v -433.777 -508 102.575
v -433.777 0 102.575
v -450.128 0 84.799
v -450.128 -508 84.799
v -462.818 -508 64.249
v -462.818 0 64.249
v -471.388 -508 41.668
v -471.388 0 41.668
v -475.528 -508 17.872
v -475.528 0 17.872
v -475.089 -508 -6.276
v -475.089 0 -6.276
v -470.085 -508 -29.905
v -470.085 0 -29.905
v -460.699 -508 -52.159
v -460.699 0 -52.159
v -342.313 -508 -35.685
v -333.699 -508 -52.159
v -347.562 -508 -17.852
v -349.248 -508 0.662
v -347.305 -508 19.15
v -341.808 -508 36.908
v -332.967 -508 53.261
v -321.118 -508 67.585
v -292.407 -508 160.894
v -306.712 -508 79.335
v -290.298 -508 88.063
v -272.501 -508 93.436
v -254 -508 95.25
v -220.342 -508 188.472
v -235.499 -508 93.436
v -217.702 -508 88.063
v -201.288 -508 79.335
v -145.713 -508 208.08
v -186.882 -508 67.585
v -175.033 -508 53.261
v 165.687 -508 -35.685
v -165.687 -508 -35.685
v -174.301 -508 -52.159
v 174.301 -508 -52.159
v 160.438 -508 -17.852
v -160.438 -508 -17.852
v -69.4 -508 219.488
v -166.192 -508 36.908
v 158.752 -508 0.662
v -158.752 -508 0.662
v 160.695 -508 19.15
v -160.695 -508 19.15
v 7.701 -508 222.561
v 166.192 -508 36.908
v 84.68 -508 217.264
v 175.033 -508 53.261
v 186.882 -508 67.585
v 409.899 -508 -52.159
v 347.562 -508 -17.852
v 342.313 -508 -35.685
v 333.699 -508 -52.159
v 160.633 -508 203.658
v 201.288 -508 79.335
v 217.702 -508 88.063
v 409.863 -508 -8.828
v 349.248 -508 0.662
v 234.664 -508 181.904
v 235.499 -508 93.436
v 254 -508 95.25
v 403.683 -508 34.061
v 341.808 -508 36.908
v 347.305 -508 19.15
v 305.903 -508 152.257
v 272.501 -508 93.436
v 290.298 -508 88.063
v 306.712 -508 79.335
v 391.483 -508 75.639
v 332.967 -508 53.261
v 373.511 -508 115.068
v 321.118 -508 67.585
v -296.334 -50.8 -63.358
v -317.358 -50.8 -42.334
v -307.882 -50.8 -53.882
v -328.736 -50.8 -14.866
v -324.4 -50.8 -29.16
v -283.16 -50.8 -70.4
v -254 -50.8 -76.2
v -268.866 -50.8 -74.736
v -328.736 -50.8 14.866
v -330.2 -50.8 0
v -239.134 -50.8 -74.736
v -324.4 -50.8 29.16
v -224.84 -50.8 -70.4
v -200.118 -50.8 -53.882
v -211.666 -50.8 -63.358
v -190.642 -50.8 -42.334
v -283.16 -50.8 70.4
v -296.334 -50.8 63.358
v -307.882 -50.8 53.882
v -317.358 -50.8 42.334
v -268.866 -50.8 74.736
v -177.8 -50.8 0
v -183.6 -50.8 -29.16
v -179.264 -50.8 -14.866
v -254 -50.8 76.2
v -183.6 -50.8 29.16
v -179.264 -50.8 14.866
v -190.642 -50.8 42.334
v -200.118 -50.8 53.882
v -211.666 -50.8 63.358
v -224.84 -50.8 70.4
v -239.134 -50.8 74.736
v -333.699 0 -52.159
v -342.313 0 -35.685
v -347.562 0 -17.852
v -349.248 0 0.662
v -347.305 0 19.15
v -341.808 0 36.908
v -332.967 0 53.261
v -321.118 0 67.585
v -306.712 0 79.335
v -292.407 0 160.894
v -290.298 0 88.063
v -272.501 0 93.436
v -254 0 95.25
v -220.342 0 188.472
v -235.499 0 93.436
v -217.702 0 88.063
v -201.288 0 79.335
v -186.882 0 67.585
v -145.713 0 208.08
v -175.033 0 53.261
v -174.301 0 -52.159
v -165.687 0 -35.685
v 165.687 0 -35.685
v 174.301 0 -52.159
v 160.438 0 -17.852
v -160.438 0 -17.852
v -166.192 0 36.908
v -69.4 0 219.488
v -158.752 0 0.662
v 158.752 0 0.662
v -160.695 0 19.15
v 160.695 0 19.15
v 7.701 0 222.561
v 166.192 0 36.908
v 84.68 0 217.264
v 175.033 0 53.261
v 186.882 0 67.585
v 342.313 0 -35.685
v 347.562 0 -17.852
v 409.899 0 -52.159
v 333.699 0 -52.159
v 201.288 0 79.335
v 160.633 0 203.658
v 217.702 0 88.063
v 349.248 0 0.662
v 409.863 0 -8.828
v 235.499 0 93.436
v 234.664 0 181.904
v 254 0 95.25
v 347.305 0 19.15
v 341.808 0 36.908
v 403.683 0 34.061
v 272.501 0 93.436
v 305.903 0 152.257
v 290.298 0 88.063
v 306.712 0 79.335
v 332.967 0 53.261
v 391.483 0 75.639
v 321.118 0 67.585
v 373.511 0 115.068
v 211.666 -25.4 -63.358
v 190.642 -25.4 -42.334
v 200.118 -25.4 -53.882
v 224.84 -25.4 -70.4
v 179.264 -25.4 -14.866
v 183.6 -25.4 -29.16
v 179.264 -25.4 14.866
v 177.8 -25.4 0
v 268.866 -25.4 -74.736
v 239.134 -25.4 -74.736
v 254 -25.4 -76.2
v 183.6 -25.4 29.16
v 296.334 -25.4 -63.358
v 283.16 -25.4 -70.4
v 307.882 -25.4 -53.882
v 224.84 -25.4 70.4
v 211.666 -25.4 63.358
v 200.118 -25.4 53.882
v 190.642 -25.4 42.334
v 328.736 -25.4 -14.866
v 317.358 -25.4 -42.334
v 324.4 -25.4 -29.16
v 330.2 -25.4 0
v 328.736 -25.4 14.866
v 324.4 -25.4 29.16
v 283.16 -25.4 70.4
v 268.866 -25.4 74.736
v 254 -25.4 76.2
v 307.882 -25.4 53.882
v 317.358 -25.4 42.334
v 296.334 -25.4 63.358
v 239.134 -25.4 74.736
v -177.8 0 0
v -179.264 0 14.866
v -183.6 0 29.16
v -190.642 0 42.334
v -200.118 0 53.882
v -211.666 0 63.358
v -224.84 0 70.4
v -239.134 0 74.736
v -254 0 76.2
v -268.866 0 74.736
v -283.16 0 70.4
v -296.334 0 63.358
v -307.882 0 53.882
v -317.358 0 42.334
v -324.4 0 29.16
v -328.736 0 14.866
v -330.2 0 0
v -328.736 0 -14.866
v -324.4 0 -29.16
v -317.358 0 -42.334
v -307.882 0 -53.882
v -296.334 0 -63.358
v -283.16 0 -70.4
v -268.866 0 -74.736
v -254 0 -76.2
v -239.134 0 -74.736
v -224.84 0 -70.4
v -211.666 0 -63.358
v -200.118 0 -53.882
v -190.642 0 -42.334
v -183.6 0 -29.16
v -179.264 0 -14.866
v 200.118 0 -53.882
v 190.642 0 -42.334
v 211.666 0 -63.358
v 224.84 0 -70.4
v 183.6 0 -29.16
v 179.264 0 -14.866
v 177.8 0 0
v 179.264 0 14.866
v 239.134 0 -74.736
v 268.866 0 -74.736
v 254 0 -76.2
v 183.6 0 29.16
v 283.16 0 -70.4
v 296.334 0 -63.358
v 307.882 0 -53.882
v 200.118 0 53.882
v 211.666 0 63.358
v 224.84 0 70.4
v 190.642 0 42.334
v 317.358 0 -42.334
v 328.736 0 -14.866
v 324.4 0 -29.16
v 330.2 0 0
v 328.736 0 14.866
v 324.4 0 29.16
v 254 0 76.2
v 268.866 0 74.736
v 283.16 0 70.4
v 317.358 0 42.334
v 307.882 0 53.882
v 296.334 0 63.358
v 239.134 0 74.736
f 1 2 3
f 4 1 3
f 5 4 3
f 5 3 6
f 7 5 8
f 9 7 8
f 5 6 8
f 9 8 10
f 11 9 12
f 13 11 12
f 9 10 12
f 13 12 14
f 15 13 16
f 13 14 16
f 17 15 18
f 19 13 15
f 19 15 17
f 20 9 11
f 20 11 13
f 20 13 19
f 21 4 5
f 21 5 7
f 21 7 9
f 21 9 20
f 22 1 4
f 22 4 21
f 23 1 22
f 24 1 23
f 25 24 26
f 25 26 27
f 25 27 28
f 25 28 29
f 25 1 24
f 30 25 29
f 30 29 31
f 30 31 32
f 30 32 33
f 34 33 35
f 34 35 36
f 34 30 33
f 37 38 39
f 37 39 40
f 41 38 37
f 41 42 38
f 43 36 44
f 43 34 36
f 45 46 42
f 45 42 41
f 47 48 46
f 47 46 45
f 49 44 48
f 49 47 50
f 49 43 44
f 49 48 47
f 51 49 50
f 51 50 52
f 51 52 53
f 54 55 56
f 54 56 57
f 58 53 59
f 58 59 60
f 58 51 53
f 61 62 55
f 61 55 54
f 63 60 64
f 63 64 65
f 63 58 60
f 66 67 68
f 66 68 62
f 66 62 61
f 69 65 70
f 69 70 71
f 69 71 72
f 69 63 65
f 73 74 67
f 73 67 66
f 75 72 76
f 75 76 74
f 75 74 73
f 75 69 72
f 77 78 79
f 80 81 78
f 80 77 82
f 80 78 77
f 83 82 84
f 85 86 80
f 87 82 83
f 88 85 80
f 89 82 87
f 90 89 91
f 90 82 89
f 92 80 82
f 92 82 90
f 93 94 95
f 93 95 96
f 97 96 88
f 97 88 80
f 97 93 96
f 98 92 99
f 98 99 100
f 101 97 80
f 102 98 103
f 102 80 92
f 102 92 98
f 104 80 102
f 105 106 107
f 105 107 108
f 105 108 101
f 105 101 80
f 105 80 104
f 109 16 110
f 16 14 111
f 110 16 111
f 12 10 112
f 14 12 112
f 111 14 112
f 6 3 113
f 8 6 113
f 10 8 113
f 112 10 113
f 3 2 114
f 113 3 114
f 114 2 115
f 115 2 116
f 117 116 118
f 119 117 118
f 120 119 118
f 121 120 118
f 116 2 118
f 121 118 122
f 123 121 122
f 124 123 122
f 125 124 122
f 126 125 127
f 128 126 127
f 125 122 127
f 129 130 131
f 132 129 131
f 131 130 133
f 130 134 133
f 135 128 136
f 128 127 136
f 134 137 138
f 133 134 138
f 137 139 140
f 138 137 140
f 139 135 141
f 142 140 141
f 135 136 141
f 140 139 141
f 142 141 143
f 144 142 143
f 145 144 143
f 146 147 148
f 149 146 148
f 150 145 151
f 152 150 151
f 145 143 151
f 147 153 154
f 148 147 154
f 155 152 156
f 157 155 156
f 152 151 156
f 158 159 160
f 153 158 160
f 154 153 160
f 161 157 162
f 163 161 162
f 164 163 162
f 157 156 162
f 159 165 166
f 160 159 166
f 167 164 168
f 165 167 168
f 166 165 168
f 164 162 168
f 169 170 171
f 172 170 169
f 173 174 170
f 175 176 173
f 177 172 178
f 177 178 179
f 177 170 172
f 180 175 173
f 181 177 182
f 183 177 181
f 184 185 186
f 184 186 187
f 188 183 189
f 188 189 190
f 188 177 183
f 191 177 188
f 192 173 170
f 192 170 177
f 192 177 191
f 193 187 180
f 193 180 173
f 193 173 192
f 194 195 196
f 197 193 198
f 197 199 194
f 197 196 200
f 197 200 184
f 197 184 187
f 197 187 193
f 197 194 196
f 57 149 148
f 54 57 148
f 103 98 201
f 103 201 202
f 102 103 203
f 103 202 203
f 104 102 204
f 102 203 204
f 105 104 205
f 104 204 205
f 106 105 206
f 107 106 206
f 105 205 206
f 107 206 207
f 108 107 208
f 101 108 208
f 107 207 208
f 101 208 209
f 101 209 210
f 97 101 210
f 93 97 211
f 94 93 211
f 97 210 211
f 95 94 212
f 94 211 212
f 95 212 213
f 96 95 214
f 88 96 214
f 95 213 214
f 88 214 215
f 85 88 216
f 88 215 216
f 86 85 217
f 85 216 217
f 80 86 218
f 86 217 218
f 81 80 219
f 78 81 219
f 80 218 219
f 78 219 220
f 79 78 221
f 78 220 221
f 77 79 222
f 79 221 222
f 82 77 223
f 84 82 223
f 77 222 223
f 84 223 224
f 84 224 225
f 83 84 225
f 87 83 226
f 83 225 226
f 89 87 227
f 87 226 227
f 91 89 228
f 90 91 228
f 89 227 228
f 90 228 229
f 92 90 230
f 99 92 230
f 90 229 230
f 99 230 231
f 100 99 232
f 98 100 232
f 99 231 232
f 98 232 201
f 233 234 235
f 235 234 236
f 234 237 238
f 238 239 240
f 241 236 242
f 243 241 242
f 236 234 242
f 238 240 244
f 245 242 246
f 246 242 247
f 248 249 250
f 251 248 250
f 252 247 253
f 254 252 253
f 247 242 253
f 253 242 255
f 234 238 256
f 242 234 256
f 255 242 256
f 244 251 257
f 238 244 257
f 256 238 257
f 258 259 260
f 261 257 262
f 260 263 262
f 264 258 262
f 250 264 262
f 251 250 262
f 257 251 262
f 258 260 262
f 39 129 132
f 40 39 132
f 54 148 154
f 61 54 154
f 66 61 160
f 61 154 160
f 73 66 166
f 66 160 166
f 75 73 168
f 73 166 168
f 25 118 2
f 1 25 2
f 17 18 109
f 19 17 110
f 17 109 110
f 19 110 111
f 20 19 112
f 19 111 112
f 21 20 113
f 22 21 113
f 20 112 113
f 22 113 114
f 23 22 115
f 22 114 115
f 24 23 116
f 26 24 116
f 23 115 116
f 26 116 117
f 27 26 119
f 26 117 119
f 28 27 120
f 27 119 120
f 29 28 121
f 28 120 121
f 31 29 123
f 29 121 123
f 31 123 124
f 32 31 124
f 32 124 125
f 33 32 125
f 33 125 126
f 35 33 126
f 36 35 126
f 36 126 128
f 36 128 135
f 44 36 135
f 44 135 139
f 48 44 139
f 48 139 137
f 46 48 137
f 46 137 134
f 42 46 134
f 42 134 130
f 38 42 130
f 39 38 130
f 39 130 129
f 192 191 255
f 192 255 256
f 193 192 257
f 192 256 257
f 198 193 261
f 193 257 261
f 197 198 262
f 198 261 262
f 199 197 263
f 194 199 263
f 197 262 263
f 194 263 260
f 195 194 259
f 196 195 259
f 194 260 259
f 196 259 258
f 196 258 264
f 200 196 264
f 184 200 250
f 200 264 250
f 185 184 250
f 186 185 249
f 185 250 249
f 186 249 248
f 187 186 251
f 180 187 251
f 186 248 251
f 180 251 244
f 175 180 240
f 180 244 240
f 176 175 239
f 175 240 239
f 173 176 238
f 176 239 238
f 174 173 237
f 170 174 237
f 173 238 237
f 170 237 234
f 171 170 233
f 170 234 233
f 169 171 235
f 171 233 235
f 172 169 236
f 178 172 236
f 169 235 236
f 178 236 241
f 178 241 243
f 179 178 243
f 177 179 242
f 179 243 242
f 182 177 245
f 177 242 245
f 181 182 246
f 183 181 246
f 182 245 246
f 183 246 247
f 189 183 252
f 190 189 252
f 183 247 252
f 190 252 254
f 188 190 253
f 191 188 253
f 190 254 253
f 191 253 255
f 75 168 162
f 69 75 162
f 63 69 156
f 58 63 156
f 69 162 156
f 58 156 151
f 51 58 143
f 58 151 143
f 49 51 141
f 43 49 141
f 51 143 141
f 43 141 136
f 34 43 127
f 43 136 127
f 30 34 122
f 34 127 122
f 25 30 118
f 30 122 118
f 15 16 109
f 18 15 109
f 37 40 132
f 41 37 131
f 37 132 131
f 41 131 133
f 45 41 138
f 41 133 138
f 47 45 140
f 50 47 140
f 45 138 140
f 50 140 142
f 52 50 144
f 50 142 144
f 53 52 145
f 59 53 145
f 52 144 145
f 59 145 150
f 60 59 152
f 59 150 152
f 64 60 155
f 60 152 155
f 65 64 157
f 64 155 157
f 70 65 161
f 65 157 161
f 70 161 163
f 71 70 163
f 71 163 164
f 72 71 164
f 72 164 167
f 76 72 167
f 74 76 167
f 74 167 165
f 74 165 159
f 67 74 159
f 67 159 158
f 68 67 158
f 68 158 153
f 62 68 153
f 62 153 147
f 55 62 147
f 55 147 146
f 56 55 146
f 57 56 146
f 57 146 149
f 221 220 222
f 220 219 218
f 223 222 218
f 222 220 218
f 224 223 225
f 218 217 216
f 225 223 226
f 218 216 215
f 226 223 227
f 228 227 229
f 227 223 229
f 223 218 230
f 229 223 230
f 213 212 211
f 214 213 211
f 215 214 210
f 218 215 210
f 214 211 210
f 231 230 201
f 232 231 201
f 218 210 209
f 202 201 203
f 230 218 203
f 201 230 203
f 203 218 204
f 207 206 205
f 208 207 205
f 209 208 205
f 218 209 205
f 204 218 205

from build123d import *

# Parameters (mm, degrees)
F1_DEPTH = 508
F0_R     = 76.2
F2_DEPTH = 25.4
F3_R     = 76.2
F4_DEPTH = 25.4


with BuildPart() as f1:
    # F0 (on Front) → F1 (new body)
    with BuildSketch(Plane.XZ):
        with BuildLine():
            ThreePointArc((-333.699202, -52.159369), (-254, 95.25), (-174.300798, -52.159369))
            Line((-174.300798, -52.159369), (174.300798, -52.159369))
            ThreePointArc((174.300798, -52.159369), (254, 95.25), (333.699202, -52.159369))
            Line((333.699202, -52.159369), (409.899202, -52.159369))
            ThreePointArc((409.899202, -52.159369), (403.682986, 34.060578), (373.511194, 115.067883))
            ThreePointArc((373.511194, 115.067883), (46.262246, 220.957142), (-292.406975, 160.894107))
            Line((-292.406975, 160.894107), (-433.776977, 102.575199))
            ThreePointArc((-433.776977, 102.575199), (-474.025326, 29.868619), (-460.699202, -52.159369))
            Line((-460.699202, -52.159369), (-333.699202, -52.159369))
        make_face()
    extrude(amount=F1_DEPTH)

    # F0 (on Front) → F2 (join)
    with BuildSketch(Plane.XZ):
        with Locations((-254, 0)):
            Circle(F0_R)
        with Locations((254, 0)):
            Circle(F0_R)
        with BuildLine():
            ThreePointArc((-333.699202, -52.159369), (-254, 95.25), (-174.300798, -52.159369))
            Line((-174.300798, -52.159369), (174.300798, -52.159369))
            ThreePointArc((174.300798, -52.159369), (254, 95.25), (333.699202, -52.159369))
            Line((333.699202, -52.159369), (409.899202, -52.159369))
            ThreePointArc((409.899202, -52.159369), (403.682986, 34.060578), (373.511194, 115.067883))
            ThreePointArc((373.511194, 115.067883), (46.262246, 220.957142), (-292.406975, 160.894107))
            Line((-292.406975, 160.894107), (-433.776977, 102.575199))
            ThreePointArc((-433.776977, 102.575199), (-474.025326, 29.868619), (-460.699202, -52.159369))
            Line((-460.699202, -52.159369), (-333.699202, -52.159369))
        make_face()
    extrude(amount=F2_DEPTH)

    # F3 (on face) → F4 (join)
    with BuildSketch(Plane.XZ.offset(25.4)):
        with Locations((-254, 0)):
            Circle(F3_R)
    extrude(amount=F4_DEPTH)


solid = f1.part
